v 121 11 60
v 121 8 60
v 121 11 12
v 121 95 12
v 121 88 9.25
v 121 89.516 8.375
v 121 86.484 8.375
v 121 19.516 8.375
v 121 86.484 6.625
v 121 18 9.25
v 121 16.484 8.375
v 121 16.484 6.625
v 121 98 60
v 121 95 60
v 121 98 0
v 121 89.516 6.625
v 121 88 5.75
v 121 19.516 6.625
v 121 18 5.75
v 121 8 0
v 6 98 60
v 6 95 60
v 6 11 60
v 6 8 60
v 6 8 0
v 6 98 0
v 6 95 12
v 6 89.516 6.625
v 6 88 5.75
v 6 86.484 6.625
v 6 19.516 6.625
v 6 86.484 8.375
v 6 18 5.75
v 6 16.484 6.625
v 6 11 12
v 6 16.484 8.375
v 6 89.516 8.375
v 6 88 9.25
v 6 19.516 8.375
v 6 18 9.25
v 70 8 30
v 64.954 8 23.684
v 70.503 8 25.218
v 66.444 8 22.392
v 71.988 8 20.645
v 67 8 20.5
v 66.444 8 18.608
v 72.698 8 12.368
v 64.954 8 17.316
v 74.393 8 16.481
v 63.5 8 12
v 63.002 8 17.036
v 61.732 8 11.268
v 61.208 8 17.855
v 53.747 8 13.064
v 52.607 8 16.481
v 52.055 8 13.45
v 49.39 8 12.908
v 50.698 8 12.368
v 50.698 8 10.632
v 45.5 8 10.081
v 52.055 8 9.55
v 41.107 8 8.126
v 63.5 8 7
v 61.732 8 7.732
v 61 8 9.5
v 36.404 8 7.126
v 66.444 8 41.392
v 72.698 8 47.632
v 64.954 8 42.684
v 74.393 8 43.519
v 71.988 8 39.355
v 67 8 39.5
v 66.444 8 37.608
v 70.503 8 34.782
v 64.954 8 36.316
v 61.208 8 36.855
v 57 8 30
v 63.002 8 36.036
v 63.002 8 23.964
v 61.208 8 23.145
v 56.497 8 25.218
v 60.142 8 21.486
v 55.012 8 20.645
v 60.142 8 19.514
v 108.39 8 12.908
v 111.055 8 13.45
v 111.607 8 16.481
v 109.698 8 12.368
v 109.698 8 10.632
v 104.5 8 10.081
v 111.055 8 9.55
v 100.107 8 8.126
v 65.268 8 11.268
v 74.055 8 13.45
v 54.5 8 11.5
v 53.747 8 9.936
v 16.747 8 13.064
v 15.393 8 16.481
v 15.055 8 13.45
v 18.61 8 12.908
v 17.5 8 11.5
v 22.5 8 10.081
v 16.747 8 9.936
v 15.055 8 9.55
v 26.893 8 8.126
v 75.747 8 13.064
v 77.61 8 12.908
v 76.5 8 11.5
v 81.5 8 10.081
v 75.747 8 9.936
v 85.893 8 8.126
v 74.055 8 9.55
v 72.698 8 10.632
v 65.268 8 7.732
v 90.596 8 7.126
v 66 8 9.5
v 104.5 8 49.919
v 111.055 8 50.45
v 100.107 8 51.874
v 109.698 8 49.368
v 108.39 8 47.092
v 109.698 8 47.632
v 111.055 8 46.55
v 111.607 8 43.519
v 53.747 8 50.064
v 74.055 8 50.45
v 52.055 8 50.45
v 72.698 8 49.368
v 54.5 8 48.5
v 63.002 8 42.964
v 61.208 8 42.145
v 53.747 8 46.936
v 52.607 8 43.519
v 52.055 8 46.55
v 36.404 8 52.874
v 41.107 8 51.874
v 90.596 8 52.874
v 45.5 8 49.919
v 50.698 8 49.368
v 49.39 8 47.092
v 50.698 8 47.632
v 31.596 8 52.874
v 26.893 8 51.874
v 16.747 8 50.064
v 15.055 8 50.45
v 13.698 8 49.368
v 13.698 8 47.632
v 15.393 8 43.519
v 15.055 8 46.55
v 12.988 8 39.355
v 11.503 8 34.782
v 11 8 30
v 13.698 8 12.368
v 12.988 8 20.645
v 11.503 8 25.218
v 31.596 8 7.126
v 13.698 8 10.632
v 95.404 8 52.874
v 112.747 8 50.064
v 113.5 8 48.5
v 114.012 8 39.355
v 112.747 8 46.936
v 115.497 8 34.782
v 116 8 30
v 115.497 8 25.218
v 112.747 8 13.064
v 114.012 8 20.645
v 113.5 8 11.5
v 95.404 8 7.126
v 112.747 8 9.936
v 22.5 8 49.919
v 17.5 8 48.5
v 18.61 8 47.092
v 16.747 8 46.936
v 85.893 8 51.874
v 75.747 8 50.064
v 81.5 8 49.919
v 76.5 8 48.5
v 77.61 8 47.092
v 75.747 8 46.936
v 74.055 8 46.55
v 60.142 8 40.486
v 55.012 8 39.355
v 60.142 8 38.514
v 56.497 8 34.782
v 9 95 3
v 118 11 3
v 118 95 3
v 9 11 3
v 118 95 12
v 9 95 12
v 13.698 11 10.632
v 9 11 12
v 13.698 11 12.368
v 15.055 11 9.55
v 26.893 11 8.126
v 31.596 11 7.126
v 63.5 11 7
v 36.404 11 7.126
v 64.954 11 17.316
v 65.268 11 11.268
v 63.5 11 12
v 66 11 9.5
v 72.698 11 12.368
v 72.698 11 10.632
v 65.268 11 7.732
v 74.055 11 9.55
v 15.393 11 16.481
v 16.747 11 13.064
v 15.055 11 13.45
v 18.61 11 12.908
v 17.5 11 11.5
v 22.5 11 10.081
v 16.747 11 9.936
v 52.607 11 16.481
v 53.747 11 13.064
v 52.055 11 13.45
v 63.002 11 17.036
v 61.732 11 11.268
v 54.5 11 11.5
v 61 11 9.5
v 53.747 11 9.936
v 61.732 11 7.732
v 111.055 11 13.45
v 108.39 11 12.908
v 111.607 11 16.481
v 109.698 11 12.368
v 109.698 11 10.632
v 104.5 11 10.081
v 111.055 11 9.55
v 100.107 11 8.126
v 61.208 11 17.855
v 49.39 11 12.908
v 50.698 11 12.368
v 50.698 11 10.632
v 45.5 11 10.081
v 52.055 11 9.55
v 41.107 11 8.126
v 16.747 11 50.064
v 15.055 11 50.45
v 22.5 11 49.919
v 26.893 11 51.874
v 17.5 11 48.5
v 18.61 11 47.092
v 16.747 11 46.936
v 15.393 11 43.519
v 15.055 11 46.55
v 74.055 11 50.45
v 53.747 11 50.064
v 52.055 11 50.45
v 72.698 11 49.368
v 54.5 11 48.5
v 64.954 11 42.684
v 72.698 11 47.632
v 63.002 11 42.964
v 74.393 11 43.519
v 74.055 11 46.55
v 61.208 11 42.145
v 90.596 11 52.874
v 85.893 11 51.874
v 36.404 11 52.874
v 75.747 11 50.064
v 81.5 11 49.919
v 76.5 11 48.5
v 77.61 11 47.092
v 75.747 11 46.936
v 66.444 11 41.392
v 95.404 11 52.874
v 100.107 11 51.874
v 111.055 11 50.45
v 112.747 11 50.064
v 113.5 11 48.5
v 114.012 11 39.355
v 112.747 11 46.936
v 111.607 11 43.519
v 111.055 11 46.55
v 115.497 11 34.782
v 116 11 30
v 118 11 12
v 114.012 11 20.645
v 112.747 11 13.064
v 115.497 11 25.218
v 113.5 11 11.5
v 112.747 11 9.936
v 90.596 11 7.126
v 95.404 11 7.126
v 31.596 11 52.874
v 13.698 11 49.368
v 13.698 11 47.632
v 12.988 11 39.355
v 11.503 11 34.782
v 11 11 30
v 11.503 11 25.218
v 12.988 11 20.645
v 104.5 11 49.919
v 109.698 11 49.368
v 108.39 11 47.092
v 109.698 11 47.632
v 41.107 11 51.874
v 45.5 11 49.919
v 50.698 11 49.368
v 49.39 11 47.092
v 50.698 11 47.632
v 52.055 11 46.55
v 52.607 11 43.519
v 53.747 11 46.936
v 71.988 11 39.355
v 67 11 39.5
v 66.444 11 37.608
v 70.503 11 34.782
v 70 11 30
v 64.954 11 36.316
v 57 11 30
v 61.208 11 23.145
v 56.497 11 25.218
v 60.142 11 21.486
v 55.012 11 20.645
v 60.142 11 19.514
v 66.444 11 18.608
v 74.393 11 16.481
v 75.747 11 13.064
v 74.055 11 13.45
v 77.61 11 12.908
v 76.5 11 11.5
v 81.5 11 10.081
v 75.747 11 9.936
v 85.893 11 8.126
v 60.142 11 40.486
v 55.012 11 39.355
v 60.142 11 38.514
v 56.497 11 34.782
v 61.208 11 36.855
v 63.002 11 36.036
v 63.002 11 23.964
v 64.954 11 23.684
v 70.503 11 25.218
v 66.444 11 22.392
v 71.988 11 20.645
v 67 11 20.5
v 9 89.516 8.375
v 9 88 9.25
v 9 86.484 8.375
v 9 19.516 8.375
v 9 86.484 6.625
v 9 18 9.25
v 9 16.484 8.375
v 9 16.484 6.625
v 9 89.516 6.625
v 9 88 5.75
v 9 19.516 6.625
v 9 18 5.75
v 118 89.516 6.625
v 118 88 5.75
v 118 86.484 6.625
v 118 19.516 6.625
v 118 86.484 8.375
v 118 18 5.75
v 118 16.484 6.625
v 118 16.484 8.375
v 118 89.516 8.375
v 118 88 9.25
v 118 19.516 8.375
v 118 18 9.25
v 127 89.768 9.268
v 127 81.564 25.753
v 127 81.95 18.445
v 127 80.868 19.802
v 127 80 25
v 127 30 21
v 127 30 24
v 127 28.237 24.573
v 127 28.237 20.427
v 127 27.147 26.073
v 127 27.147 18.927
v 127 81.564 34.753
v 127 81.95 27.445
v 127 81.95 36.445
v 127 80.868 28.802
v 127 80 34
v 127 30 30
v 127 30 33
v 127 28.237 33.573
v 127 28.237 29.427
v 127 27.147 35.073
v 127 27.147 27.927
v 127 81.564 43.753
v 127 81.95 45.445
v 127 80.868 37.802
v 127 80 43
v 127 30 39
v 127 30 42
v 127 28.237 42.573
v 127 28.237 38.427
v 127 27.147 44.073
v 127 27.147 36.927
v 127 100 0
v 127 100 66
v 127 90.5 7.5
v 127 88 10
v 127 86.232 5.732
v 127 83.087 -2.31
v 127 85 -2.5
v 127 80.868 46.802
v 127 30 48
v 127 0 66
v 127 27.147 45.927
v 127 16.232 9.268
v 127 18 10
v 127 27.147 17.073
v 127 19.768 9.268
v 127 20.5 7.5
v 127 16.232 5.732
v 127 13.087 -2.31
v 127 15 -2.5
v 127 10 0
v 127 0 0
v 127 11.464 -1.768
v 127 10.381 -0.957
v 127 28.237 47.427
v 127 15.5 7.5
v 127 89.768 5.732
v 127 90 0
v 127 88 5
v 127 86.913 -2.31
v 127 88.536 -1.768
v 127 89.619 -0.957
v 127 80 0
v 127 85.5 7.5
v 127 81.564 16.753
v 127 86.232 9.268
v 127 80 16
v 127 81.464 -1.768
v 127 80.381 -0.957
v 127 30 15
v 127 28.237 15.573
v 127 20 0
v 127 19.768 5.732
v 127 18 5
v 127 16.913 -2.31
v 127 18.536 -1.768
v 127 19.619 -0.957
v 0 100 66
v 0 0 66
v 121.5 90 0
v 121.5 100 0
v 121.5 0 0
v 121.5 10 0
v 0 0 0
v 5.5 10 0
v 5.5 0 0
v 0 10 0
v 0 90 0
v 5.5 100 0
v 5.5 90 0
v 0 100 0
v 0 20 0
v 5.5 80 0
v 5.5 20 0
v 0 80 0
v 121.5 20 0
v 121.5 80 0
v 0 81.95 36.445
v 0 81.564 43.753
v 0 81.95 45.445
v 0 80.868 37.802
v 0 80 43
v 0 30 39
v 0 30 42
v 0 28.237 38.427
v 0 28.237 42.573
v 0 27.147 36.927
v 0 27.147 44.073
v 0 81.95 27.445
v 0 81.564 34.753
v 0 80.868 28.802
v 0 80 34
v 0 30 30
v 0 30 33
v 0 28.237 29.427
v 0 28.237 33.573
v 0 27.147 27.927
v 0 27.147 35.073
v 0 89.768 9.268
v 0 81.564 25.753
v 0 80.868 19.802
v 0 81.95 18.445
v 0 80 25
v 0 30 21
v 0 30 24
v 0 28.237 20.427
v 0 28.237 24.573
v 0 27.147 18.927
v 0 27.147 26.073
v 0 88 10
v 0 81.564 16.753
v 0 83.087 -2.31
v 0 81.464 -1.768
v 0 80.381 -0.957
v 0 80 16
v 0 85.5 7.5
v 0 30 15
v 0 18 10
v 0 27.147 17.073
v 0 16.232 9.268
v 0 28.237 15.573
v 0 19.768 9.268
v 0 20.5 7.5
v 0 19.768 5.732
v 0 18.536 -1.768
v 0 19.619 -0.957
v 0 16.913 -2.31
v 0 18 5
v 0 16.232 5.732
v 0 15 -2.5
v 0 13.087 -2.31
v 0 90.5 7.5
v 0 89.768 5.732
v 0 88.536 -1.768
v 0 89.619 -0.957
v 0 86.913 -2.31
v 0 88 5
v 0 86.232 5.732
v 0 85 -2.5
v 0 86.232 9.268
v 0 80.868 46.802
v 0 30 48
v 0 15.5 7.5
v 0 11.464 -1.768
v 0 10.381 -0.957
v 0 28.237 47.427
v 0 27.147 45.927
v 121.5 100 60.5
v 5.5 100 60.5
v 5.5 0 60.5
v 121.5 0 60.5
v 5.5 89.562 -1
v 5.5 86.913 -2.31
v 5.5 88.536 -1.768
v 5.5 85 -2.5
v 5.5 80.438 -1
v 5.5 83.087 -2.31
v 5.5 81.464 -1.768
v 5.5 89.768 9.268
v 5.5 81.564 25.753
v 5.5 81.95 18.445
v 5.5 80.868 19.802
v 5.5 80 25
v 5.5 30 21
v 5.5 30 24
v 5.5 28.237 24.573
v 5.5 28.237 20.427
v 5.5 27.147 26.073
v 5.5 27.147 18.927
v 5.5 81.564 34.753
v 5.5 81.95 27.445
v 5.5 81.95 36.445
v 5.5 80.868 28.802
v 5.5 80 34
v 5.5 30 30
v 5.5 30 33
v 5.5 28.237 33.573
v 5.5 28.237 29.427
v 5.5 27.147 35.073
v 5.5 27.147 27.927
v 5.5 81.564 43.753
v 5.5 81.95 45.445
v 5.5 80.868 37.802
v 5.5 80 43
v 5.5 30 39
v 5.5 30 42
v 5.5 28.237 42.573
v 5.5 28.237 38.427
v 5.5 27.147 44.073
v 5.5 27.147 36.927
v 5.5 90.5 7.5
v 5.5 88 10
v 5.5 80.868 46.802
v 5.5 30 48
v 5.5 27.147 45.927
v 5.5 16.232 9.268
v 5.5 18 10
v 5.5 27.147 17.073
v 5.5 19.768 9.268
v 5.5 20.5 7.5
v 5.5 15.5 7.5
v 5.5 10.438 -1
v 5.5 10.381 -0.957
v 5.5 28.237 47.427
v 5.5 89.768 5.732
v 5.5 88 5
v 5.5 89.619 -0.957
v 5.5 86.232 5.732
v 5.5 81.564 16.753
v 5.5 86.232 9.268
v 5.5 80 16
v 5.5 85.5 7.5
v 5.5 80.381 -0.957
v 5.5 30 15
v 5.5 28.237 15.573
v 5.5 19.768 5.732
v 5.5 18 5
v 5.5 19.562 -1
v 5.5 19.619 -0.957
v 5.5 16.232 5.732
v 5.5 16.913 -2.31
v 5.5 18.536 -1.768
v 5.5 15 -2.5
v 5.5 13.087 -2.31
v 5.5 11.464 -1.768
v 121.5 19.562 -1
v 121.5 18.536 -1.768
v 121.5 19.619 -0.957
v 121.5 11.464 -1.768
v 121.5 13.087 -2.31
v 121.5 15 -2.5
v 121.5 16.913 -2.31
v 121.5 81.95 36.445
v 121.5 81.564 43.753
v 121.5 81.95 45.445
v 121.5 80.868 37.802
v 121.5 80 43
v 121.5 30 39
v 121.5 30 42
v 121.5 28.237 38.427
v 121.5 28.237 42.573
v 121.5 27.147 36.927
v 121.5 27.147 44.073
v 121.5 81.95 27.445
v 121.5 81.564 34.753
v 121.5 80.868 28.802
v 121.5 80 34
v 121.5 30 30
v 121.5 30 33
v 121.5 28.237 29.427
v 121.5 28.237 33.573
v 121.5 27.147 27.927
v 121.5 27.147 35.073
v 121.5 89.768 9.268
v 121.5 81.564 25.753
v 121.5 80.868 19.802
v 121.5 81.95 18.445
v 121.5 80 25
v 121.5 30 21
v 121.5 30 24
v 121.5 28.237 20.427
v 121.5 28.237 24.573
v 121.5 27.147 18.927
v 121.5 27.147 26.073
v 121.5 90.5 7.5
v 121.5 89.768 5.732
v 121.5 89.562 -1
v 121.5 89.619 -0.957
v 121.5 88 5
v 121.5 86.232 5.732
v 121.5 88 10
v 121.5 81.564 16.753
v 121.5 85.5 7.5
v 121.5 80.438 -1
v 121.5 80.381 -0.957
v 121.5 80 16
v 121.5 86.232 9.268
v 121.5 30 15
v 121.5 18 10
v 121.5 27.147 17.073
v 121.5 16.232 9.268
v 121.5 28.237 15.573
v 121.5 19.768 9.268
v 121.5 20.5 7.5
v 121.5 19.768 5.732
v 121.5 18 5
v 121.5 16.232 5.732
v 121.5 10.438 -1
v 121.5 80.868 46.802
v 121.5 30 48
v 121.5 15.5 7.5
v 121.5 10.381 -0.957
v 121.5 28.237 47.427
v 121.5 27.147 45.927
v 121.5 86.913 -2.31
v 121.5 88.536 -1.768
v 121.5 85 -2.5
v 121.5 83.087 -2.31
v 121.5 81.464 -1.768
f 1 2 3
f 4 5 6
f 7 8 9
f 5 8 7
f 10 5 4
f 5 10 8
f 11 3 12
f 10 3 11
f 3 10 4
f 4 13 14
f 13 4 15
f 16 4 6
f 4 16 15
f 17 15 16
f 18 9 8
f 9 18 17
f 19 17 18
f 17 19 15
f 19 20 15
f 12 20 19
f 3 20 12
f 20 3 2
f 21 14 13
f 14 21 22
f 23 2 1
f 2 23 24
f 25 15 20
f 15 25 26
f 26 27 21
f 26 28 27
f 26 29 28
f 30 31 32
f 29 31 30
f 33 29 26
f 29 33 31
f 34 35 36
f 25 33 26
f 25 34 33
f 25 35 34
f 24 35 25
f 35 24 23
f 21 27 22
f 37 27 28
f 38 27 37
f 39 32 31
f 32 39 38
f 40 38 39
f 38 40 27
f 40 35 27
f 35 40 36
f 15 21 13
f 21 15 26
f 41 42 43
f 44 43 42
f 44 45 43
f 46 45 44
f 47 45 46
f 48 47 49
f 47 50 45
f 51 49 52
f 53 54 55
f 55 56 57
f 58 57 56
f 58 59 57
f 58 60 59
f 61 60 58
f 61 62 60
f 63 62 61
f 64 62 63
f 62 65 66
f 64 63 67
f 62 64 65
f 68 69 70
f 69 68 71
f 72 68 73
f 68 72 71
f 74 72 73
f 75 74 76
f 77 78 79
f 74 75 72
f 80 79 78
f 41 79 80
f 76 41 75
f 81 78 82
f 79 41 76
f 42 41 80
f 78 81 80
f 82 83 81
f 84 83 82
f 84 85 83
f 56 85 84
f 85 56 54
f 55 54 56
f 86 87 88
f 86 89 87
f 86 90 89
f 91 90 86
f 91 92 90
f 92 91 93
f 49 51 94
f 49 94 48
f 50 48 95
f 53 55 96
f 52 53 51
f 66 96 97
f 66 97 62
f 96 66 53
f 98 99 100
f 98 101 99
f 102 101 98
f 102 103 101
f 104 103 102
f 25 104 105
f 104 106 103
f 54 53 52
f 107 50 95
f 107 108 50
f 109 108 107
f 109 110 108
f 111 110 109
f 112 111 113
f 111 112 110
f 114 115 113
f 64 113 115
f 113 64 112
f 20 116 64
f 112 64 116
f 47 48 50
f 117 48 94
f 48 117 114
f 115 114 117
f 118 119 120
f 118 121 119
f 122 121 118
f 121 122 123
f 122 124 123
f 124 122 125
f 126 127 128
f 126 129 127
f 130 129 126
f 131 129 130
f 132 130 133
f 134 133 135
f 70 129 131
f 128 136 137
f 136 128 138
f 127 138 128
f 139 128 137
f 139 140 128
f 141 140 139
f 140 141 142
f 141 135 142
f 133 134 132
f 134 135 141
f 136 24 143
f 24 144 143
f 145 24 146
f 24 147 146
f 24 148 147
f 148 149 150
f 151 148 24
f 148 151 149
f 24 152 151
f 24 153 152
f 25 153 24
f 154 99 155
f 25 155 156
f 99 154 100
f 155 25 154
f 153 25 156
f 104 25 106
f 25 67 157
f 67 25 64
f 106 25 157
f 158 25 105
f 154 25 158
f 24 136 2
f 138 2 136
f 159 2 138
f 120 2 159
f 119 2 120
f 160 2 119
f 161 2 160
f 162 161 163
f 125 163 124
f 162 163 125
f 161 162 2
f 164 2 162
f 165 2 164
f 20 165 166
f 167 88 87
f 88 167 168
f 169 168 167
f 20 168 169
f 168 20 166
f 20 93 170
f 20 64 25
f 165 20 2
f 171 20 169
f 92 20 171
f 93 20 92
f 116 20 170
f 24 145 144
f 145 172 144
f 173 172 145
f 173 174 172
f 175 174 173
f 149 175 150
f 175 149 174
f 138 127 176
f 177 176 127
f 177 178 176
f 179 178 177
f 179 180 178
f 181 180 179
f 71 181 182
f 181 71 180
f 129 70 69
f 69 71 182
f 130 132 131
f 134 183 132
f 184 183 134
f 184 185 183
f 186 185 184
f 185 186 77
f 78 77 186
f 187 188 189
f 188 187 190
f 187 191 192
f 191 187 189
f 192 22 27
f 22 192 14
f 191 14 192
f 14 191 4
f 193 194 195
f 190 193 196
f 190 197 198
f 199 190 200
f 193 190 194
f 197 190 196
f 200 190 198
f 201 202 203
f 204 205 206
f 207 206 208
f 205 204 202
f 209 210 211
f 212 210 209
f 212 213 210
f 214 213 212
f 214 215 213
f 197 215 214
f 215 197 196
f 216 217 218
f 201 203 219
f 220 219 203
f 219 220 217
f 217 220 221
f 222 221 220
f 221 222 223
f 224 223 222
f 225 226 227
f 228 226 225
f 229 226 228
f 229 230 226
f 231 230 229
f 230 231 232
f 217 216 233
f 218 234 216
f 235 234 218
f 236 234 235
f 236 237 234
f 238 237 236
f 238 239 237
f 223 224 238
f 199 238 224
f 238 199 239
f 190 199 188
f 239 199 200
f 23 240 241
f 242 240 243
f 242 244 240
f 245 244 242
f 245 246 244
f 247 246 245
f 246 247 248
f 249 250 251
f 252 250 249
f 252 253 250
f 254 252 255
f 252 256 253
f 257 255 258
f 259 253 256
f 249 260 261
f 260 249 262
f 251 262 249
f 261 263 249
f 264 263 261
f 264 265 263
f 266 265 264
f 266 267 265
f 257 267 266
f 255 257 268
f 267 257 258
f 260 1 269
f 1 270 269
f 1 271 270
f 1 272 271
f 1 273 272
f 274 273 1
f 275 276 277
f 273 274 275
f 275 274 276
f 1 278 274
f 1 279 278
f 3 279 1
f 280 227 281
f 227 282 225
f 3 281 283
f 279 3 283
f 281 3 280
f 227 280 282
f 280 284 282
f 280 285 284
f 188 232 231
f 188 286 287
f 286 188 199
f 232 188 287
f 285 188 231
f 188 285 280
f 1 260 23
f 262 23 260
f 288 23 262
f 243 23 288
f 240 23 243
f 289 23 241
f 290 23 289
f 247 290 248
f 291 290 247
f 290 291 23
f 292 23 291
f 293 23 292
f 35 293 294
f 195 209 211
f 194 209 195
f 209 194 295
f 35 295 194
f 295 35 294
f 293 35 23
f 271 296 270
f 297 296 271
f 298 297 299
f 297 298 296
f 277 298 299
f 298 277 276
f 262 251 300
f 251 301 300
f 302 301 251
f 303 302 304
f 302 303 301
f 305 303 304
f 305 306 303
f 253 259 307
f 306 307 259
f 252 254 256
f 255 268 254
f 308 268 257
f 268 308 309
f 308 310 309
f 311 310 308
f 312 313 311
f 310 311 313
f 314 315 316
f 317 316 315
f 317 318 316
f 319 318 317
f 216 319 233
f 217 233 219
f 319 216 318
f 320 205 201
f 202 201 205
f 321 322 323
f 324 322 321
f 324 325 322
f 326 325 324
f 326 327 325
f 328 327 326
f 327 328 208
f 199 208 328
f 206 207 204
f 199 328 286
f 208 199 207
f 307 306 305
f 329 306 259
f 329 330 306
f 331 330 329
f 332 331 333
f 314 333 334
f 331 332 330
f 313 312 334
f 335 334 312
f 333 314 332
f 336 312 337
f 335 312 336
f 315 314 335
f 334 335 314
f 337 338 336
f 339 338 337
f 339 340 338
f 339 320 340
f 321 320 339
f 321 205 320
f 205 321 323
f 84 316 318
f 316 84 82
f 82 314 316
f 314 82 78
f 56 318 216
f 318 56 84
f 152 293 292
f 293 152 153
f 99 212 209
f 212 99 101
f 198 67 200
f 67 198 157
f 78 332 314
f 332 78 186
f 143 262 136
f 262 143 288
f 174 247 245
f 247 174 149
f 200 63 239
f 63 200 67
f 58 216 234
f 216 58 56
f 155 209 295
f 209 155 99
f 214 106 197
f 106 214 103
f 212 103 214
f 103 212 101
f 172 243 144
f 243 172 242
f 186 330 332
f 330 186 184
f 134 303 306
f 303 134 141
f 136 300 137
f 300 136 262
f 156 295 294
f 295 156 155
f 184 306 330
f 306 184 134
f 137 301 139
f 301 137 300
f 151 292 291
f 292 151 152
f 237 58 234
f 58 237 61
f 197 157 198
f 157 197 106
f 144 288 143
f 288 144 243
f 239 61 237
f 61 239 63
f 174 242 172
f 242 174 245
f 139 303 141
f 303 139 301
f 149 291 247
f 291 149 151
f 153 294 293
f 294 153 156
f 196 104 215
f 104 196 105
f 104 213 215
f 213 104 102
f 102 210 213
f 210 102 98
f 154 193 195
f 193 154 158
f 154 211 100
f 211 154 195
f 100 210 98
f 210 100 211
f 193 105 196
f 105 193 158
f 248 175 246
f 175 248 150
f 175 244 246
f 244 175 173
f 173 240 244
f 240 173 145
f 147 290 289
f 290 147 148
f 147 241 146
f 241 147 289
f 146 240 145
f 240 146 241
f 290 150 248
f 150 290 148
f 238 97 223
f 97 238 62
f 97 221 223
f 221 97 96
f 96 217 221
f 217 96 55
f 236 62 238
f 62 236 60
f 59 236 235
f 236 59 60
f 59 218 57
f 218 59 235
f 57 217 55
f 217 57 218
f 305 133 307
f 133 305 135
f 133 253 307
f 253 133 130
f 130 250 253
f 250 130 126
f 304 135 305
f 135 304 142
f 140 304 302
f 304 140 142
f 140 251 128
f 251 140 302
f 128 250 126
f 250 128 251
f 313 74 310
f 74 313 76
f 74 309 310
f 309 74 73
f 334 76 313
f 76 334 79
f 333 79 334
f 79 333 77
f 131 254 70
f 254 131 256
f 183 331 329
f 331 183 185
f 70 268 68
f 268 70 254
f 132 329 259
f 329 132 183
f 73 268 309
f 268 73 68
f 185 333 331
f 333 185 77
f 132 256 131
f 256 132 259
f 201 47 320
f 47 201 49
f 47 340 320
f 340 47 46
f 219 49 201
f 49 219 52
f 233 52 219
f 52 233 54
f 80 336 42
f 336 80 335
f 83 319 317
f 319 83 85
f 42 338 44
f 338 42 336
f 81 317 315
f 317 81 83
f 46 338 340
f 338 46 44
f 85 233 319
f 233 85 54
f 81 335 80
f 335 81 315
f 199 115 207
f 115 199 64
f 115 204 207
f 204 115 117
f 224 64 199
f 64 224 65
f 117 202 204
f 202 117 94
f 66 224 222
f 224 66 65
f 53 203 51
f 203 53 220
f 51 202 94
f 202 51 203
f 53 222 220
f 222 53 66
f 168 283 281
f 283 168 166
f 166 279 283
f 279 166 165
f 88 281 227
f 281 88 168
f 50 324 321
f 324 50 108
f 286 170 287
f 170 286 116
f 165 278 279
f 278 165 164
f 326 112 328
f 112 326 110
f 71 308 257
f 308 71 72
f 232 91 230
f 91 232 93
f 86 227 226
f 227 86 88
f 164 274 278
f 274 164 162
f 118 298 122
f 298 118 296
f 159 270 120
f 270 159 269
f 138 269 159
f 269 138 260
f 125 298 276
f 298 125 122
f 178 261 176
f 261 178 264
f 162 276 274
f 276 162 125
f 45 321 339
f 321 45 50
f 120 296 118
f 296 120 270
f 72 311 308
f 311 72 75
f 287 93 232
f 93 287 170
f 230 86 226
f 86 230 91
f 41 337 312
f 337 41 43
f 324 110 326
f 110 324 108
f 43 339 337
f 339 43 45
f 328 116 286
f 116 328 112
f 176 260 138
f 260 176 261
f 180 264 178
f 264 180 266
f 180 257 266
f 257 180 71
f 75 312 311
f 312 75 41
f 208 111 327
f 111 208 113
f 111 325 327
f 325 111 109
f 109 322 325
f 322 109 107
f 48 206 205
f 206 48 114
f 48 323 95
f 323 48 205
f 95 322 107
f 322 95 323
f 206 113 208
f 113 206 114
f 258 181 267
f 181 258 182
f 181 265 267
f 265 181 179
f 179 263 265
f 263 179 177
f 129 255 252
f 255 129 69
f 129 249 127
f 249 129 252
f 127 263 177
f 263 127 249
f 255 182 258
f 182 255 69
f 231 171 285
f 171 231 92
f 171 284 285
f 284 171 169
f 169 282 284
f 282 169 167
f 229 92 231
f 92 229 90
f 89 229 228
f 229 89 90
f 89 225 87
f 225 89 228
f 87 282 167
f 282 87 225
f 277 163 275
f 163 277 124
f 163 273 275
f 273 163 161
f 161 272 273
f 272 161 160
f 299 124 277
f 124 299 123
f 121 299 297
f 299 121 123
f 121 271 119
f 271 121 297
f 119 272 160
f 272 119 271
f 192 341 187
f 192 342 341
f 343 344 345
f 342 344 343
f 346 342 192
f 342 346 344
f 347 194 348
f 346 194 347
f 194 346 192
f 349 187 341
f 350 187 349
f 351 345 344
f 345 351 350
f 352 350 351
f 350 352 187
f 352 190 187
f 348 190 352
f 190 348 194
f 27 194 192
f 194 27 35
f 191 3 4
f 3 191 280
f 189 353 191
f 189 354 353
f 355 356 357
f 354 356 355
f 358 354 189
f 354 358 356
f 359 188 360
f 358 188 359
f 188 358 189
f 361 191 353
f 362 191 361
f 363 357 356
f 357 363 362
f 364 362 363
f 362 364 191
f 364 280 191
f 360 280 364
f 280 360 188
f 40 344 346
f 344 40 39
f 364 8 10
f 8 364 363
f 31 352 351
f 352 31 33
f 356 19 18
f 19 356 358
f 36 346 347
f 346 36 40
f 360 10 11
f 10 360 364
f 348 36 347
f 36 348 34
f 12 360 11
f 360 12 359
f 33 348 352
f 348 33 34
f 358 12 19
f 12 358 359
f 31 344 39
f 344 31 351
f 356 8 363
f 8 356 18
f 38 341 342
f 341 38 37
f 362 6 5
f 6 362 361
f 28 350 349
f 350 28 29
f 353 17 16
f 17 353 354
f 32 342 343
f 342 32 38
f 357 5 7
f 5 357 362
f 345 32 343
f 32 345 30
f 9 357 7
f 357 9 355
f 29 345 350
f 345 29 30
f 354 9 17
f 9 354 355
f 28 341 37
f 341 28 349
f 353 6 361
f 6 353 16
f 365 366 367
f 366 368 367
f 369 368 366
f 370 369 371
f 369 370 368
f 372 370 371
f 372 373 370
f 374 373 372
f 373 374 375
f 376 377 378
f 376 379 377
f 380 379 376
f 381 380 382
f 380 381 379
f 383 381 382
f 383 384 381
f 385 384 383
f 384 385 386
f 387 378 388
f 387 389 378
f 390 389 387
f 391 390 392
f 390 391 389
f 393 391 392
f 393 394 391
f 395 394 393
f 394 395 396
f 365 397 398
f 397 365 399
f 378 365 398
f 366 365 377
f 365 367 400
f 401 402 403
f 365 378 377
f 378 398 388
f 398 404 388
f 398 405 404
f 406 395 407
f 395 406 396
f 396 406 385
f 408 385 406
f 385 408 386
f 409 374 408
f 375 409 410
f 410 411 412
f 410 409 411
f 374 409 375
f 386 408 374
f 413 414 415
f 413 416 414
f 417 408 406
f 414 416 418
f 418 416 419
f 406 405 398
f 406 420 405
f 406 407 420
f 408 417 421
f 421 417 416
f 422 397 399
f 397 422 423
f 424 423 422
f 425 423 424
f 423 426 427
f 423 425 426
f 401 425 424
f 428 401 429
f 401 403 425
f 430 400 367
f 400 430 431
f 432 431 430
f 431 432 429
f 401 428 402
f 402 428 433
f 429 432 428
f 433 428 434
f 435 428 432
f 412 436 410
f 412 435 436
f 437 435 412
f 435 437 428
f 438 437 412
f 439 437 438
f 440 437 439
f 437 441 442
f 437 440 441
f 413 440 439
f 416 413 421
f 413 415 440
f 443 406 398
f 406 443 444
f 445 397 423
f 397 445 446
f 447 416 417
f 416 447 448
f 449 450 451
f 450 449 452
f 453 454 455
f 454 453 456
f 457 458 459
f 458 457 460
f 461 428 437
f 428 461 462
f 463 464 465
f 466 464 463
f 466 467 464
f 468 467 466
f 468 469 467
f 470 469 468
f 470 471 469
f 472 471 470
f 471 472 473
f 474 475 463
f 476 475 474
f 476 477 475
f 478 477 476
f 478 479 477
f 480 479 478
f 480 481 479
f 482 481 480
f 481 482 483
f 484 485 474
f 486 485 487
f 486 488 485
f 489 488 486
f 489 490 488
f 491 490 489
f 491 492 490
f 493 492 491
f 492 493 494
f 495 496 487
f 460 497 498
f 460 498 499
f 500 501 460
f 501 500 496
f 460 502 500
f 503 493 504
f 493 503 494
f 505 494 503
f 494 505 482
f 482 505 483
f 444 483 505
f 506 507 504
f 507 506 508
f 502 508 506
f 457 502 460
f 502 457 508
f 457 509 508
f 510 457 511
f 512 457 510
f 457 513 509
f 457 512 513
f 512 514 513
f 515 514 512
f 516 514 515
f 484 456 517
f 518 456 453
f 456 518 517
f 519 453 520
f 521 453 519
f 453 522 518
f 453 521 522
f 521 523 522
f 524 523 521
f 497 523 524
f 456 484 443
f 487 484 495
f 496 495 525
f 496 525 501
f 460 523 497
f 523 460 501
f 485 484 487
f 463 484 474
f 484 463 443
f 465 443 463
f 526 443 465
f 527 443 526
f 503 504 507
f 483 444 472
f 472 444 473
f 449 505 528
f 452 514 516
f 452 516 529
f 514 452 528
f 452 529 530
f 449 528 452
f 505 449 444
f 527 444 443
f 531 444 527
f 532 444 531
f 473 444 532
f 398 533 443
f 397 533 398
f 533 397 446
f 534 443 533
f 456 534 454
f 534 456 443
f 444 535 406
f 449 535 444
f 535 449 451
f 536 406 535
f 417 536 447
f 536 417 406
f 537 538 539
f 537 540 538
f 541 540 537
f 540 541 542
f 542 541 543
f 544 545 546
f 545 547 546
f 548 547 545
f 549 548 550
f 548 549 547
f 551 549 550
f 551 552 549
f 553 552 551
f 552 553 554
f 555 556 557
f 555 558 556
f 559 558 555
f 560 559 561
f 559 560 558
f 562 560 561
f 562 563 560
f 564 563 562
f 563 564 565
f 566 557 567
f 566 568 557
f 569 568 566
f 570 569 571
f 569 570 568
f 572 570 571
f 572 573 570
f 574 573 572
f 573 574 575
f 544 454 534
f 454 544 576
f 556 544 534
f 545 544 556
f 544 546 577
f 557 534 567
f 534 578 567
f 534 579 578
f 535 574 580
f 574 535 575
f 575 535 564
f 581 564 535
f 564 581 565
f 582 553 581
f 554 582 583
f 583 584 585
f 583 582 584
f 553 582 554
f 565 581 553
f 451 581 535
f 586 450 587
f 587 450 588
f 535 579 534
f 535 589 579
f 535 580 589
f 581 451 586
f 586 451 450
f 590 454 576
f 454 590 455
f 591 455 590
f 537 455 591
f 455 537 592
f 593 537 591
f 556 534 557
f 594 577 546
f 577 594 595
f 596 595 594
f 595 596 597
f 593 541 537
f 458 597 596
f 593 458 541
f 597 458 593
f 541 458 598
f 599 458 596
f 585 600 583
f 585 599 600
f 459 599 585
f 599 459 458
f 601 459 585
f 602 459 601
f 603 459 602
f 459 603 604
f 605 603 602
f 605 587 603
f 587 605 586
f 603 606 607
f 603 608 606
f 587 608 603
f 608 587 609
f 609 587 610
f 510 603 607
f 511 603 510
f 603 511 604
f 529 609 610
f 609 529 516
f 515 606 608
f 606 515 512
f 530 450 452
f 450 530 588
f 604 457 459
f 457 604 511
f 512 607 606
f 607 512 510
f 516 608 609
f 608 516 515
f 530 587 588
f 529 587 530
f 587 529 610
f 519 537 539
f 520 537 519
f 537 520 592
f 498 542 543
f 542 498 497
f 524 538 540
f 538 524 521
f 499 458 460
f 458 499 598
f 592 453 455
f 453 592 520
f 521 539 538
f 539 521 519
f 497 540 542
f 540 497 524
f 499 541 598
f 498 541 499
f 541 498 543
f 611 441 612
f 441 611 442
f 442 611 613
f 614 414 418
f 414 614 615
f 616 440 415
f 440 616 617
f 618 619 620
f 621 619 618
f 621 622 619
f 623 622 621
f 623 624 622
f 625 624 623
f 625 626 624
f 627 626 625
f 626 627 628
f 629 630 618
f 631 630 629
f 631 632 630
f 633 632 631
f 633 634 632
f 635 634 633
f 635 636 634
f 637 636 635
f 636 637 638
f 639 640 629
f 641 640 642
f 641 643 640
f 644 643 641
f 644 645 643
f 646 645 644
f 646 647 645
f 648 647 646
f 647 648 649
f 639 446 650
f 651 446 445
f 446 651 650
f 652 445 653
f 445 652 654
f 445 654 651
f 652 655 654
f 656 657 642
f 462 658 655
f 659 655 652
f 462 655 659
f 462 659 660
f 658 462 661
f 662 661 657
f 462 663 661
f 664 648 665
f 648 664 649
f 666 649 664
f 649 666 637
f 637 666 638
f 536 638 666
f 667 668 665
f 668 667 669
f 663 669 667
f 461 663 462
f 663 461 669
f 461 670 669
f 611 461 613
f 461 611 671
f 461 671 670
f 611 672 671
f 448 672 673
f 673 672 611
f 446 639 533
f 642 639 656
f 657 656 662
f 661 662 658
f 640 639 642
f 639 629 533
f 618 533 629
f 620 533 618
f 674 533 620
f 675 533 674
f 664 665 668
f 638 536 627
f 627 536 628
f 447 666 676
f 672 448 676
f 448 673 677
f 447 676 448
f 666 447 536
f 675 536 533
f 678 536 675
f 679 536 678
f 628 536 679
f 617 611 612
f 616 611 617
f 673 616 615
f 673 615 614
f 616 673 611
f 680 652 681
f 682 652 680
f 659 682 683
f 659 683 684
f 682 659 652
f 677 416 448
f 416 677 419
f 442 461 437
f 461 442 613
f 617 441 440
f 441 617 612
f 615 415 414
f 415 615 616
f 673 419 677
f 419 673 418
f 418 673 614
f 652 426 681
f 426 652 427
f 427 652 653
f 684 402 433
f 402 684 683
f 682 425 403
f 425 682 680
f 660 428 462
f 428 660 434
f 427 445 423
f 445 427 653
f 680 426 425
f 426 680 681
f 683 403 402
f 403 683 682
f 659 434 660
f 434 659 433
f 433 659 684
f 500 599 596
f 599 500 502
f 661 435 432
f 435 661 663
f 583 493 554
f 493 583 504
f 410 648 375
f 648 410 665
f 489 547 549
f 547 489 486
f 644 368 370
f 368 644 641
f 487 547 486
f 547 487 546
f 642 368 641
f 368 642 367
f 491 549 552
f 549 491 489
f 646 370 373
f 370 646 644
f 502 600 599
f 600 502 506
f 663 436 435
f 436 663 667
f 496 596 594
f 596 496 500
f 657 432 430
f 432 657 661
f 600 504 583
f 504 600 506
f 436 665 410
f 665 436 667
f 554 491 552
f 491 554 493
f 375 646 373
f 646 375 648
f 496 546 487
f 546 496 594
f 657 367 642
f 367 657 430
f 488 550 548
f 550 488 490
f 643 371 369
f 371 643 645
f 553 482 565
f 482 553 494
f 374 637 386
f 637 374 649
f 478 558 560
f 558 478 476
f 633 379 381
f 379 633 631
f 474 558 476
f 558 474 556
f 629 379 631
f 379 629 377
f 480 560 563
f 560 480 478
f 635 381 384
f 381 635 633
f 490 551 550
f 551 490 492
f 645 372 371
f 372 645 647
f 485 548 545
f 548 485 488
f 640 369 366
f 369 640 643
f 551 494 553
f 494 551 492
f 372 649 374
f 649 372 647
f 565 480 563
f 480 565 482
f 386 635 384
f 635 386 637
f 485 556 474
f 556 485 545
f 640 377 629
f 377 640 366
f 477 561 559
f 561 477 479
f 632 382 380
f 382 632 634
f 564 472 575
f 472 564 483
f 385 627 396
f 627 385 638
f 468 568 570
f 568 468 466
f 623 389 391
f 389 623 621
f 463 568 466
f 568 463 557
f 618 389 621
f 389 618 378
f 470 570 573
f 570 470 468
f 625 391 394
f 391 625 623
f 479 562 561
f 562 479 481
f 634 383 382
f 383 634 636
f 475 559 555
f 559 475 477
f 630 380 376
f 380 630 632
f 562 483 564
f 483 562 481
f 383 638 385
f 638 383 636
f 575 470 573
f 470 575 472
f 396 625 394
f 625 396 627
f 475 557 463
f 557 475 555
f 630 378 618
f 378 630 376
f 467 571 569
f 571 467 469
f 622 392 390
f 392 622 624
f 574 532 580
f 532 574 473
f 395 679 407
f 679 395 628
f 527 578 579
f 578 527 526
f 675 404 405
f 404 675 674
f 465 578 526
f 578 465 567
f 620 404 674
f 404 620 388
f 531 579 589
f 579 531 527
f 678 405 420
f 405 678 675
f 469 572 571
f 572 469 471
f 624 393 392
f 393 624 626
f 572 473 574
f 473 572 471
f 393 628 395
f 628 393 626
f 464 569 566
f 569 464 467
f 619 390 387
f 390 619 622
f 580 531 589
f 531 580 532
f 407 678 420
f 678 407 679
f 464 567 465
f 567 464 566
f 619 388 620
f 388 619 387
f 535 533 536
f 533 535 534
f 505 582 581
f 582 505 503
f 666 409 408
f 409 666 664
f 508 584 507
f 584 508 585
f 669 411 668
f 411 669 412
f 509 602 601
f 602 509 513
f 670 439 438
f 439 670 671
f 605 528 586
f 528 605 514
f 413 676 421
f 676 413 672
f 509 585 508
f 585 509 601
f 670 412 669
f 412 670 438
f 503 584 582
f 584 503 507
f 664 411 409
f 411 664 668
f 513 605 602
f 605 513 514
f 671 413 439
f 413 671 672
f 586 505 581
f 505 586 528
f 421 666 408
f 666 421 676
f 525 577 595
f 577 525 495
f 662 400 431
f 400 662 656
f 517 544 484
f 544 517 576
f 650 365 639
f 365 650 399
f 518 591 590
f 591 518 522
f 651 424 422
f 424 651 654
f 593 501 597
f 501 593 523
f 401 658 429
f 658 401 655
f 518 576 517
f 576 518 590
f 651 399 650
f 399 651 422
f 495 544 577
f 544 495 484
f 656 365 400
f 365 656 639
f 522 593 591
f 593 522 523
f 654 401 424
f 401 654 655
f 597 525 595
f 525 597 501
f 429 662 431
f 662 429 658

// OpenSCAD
show="display";

if(show=="chassis"){
    chassis();
}

if(show=="lid"){
    rotate([90,0,90]) lid();
}

if(show=="display"){
    chassis();
    lid();
}

module lid() color("SaddleBrown") difference(){
    union(){
        cube([127,100,66]);
         scale([1,1,0.5]) translate([0,15,0]) 
                rotate([0,90,0]) cylinder(d=10,h=5.5);
         scale([1,1,0.5]) translate([0,85,0]) 
                rotate([0,90,0]) cylinder(d=10,h=5.5);
         scale([1,1,0.5]) translate([121.5,15,0]) 
                rotate([0,90,0]) cylinder(d=10,h=5.5);
         scale([1,1,0.5]) translate([121.5,85,0]) 
                rotate([0,90,0]) cylinder(d=10,h=5.5);
    }
    translate([5.5,-1,-1]) cube([116,102,61.5]);
    translate([-1,18,7.5]) rotate([0,90,0]) cylinder(d=5,h=129);
    translate([-1,88,7.5]) rotate([0,90,0]) cylinder(d=5,h=129);
    for(i=[18:9:45]){
        translate([-1,30,i]) rotate([0,90,0]) hull(){
            cylinder(d=6,h=129);
            translate([0,50,0]) cylinder(d=4,h=129);
        }
    }
}

module chassis() color("Goldenrod") translate([6,8,0]){
    difference(){
        cube([115,90,60]);                      //  case
        translate([-1,3,3]) cube([117,84,60]);
    
                                                //  left
        translate([28,-1,30]) rotate([-90,0,0]) cylinder(d=46,h=5);
        translate([9.5,-1,11.5]) rotate([-90,0,0]) cylinder(d=4,h=5);
        translate([9.5,-1,48.5]) rotate([-90,0,0]) cylinder(d=4,h=5);
        translate([46.5,-1,11.5]) rotate([-90,0,0]) cylinder(d=4,h=5);
        translate([46.5,-1,48.5]) rotate([-90,0,0]) cylinder(d=4,h=5);
    
                                                //  buttons
        translate([57.5,-1,39.5]) rotate([-90,0,0]) cylinder(d=7,h=5);
        translate([57.5,-1,20.5]) rotate([-90,0,0]) cylinder(d=7,h=5);
    
                                                //  LED
        translate([57.5,-1,9.5]) rotate([-90,0,0]) cylinder(d=5,h=5);
        
                                                //  right
        translate([87,-1,30]) rotate([-90,0,0]) cylinder(d=46,h=5);
        translate([68.5,-1,11.5]) rotate([-90,0,0]) cylinder(d=4,h=5);
        translate([68.5,-1,48.5]) rotate([-90,0,0]) cylinder(d=4,h=5);
        translate([105.5,-1,11.5]) rotate([-90,0,0]) cylinder(d=4,h=5);
        translate([105.5,-1,48.5]) rotate([-90,0,0]) cylinder(d=4,h=5);
    }
    difference(){
        union(){
            cube([3,90,12]);
            translate([112,0,0]) cube([3,90,12]);
        }
        translate([-1,10,7.5]) rotate([0,90,0]) cylinder(d=3.5,h=117);
        translate([-1,80,7.5]) rotate([0,90,0]) cylinder(d=3.5,h=117);
    }
}
